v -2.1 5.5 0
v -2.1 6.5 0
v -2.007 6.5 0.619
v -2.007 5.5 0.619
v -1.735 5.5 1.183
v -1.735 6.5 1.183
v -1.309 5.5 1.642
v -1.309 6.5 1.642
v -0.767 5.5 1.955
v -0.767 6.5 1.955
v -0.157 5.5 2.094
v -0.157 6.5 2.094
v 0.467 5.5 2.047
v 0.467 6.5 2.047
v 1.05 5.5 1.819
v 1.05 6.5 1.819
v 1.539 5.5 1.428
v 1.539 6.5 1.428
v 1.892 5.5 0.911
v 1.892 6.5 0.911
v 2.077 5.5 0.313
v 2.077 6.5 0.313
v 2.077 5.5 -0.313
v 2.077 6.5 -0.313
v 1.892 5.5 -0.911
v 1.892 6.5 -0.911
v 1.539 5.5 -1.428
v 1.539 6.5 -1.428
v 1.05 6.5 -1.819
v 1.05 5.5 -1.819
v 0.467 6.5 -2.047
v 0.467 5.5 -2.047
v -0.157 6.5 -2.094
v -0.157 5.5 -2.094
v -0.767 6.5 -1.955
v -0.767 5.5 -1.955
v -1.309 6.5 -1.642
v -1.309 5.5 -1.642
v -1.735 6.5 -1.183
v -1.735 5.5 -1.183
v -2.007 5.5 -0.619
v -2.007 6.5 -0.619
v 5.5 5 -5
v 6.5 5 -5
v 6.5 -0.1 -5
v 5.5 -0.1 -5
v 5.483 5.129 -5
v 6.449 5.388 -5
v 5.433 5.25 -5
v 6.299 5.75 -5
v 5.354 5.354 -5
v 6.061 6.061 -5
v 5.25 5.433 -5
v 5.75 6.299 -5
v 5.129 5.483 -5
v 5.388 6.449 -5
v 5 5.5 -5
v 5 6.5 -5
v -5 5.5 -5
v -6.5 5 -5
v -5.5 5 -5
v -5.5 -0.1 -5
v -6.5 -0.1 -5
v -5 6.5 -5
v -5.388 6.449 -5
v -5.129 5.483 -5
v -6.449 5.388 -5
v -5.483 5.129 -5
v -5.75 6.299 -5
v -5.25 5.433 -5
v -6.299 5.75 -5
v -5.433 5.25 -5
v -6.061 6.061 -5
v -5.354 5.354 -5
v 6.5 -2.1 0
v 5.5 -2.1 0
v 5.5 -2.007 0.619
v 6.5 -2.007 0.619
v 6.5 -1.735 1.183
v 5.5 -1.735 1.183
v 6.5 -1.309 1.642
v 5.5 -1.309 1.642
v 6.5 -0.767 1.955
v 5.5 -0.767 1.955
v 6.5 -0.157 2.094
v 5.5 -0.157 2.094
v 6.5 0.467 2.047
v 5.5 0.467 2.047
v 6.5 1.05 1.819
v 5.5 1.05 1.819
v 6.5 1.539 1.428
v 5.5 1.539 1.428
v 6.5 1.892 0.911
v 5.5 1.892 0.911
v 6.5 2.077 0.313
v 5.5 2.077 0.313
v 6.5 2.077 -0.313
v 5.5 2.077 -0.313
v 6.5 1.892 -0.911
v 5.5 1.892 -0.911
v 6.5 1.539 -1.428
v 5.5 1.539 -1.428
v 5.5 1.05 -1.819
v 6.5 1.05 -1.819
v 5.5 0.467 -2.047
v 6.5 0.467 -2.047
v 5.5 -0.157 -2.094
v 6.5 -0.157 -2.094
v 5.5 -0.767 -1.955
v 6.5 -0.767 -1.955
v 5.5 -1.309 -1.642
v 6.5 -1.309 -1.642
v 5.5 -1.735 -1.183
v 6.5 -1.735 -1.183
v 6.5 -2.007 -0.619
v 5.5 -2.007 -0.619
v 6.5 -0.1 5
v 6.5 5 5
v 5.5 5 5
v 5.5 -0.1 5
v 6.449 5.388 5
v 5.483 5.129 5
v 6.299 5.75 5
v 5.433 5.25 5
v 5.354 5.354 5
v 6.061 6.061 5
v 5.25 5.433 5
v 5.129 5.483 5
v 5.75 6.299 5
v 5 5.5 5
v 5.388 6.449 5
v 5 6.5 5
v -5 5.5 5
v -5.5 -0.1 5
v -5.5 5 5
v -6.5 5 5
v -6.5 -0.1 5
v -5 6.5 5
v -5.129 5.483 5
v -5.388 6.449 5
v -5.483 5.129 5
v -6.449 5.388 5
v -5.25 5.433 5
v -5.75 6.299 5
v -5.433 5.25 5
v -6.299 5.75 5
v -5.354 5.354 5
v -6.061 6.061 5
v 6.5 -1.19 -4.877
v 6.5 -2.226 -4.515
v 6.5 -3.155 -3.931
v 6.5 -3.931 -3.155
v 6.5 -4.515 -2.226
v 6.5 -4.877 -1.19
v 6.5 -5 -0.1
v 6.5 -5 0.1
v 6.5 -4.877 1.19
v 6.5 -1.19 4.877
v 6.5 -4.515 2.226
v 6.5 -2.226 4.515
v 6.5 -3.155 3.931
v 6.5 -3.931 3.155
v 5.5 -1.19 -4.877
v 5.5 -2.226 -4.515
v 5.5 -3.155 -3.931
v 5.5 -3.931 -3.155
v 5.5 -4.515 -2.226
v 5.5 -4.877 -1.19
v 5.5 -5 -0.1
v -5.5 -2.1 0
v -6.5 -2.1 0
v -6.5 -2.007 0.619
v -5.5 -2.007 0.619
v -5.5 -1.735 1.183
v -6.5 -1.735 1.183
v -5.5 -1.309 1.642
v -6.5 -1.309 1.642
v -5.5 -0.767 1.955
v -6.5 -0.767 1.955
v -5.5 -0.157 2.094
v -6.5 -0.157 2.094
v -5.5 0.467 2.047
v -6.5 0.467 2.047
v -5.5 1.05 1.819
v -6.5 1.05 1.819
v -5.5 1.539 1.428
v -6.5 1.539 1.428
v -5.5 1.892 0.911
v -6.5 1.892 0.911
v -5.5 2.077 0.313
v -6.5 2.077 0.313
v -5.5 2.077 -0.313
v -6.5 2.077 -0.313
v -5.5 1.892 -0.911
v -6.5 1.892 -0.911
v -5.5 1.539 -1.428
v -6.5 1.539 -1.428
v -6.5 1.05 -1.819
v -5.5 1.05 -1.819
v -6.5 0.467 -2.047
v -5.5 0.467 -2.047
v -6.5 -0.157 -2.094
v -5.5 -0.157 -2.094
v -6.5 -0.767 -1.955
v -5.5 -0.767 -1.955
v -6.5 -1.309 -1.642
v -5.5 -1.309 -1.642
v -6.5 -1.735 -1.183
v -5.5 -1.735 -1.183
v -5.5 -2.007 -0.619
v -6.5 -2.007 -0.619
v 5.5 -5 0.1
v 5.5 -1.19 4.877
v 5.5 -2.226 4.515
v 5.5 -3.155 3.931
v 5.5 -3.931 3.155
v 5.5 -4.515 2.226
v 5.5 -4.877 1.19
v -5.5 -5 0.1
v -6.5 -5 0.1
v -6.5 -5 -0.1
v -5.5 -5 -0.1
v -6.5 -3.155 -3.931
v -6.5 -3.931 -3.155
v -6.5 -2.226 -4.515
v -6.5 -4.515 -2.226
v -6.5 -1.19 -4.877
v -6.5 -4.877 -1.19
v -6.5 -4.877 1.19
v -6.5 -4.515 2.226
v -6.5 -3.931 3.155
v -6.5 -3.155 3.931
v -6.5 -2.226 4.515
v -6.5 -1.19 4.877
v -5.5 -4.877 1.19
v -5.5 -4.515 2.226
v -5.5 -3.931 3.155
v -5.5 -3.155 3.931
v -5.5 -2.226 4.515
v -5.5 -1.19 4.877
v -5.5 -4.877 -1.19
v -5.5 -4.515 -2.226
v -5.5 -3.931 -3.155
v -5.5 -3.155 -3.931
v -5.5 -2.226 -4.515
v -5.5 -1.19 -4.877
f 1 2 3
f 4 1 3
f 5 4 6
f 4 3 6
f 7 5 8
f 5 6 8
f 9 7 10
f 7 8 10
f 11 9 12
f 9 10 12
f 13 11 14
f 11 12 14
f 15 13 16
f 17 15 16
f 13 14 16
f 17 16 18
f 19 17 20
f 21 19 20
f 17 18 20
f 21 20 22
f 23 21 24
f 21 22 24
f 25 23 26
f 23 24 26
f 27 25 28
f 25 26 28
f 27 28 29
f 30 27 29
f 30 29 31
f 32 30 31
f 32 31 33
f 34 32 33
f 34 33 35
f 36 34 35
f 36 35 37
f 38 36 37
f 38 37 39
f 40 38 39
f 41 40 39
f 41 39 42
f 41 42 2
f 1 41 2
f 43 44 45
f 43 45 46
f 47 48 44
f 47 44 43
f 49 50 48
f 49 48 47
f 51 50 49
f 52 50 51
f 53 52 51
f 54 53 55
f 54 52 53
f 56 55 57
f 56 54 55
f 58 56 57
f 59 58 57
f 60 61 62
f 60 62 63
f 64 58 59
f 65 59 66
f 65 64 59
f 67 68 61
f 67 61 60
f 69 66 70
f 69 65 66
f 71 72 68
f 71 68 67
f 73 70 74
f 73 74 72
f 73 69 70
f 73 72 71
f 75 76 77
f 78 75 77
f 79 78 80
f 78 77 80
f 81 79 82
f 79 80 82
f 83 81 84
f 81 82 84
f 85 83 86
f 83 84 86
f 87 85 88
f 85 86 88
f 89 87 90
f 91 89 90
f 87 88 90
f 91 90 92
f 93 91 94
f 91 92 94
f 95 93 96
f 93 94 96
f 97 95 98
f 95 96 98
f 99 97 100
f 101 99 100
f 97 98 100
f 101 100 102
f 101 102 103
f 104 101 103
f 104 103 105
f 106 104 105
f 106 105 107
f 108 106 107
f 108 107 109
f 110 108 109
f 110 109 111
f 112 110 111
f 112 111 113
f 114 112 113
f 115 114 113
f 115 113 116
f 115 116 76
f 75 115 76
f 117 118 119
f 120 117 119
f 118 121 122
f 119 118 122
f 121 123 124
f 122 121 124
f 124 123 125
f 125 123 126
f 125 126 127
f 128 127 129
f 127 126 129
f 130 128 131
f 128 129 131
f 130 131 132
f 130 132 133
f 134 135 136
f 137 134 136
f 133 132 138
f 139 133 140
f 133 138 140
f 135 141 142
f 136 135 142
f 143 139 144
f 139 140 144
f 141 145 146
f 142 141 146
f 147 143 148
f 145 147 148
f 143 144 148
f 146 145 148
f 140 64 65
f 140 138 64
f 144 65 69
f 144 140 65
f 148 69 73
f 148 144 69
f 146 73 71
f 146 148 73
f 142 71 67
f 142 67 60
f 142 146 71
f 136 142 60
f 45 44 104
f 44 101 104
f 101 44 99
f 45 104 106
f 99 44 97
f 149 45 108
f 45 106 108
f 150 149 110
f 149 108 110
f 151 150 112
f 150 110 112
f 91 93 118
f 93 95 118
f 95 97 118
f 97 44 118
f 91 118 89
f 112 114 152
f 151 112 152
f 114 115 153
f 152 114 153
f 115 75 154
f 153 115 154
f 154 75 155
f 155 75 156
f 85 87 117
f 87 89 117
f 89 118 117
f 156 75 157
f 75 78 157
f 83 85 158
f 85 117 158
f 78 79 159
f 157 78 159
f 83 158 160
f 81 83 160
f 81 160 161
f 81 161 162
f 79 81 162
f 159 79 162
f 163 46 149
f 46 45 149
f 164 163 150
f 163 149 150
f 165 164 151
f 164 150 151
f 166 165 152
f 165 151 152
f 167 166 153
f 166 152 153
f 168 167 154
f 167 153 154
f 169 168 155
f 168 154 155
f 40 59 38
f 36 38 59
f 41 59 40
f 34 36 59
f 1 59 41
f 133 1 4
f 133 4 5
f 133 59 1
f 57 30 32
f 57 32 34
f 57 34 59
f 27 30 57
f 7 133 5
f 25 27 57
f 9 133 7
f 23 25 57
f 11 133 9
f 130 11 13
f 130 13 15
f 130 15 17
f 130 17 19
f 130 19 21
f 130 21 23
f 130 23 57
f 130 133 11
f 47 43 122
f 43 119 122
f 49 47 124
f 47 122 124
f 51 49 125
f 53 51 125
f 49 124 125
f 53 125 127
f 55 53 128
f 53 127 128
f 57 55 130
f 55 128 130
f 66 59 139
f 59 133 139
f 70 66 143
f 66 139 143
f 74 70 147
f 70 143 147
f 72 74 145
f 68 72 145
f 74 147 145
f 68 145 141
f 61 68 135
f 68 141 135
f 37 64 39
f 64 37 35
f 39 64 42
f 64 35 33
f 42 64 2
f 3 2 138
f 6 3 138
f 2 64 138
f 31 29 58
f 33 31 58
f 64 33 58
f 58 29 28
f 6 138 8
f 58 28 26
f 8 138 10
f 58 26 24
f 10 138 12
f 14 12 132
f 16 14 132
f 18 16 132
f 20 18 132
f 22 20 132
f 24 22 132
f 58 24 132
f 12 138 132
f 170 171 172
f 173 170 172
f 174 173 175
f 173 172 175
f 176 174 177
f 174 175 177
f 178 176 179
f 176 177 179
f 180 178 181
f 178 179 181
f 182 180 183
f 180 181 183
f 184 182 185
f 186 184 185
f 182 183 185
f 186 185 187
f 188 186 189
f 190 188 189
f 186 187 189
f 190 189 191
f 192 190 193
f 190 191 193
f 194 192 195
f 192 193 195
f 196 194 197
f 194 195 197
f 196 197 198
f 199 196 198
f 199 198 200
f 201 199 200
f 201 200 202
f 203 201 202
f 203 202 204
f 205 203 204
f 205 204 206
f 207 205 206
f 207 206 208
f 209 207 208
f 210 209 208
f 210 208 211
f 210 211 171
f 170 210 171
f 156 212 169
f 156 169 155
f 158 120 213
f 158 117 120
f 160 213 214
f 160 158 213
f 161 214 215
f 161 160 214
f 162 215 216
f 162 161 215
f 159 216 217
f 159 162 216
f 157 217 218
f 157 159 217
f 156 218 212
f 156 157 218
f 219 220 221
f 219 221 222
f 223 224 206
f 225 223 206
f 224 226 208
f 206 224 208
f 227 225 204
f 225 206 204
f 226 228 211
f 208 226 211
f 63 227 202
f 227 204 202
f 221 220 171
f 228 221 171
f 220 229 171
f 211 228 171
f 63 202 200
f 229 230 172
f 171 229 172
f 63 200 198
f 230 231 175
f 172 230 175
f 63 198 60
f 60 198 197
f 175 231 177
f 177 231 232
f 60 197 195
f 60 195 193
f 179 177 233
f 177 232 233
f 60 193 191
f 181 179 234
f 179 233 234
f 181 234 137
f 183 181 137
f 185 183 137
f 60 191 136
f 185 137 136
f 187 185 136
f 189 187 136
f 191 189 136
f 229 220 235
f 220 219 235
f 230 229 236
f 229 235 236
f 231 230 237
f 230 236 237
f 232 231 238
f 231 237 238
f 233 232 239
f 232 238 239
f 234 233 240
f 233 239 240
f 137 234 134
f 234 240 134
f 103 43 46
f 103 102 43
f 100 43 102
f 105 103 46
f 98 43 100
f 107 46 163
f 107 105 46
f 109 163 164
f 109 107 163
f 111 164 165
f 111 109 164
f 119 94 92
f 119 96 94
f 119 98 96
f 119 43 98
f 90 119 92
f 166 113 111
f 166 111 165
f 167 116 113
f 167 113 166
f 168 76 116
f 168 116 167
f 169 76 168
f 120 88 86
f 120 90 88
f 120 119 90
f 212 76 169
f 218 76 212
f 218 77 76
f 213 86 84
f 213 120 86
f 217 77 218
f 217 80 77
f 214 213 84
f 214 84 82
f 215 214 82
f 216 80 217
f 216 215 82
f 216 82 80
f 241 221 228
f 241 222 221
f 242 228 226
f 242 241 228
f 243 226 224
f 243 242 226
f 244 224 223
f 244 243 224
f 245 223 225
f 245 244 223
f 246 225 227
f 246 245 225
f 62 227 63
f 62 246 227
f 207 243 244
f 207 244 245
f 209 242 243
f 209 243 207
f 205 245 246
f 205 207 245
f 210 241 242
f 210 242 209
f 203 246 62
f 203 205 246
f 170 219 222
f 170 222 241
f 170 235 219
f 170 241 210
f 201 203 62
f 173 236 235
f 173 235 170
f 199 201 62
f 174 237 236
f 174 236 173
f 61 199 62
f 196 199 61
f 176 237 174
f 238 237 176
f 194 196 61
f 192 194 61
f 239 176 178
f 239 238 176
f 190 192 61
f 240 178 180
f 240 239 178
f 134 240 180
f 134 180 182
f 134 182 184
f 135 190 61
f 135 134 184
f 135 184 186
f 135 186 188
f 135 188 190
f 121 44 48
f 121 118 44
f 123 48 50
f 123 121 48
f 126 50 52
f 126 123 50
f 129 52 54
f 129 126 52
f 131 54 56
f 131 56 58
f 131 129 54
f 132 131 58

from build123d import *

# Parameters (mm, degrees)
PAD_DEPTH       = 5
SKETCH001_R     = 2.1
POCKET_DEPTH    = 13.001
SKETCH002_R     = 2.1
POCKET001_DEPTH = 5
FILLET_R        = 4.9


with BuildPart() as part:
    # Sketch → Pad (new body, symmetric)
    with BuildSketch(Plane.XY):
        with BuildLine():
            Line((-6.5, -5), (-6.5, 5))
            ThreePointArc((-5, 6.5), (-6.06066, 6.06066), (-6.5, 5))
            Line((-5, 6.5), (5, 6.5))
            ThreePointArc((6.5, 5), (6.06066, 6.06066), (5, 6.5))
            Line((6.5, 5), (6.5, -5))
            Line((5.5, -5), (6.5, -5))
            Line((5.5, 4.999996), (5.5, -5))
            ThreePointArc((5.5, 4.999996), (5.353558, 5.353549), (5.000009, 5.5))
            Line((-5, 5.5), (5.000009, 5.5))
            ThreePointArc((-5, 5.5), (-5.353553, 5.353553), (-5.5, 5))
            Line((-5.5, -5), (-5.5, 5))
            Line((-6.5, -5), (-5.5, -5))
        make_face()
    extrude(amount=PAD_DEPTH, both=True)

    # Sketch001 → Pocket (cut, through all)
    with BuildSketch(Plane(origin=(-6.5, 0, 0), x_dir=(0, -1, 0), z_dir=(-1, 0, 0))):
        Circle(SKETCH001_R)
    extrude(amount=-POCKET_DEPTH, mode=Mode.SUBTRACT)

    # Sketch002 → Pocket001 (cut)
    with BuildSketch(Plane(origin=(0, 6.5, 0), x_dir=(-1, 0, 0), z_dir=(0, 1, 0))):
        Circle(SKETCH002_R)
    extrude(amount=-POCKET001_DEPTH, mode=Mode.SUBTRACT)

    # Fillet
    fillet_edges = [part.edges().sort_by_distance(p)[0] for p in [
        (-6, -5, -5),
        (6, -5, -5),
        (6, -5, 5),
        (-6, -5, 5),
    ]]
    fillet(fillet_edges, radius=FILLET_R)


solid = part.part
